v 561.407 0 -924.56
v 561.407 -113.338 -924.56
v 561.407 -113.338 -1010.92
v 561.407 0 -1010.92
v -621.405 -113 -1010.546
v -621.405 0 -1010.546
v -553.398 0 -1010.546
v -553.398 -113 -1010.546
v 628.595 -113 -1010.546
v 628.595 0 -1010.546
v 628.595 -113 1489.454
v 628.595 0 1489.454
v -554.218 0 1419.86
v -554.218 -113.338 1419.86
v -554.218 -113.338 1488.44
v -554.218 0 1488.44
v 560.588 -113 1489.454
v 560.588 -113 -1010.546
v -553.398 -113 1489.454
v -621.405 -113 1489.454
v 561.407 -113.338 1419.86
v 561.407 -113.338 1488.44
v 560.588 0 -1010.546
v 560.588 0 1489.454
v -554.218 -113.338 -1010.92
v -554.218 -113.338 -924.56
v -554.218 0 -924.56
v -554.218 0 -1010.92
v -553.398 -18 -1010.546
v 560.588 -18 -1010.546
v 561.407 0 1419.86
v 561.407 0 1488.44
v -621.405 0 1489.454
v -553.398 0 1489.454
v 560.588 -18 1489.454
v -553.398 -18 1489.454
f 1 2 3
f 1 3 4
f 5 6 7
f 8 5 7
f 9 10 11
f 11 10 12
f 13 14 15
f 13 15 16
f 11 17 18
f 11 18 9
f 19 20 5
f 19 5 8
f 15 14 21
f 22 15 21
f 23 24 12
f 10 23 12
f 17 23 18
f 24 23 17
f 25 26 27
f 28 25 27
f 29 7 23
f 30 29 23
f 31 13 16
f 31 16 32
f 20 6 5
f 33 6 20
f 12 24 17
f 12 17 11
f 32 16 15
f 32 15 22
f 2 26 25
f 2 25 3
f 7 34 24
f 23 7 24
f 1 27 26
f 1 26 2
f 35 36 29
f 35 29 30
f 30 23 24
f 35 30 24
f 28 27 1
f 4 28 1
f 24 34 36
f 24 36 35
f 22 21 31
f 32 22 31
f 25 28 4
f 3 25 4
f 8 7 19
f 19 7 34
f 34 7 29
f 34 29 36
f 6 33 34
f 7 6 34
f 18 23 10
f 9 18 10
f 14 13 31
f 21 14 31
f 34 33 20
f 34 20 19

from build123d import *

# Parameters (mm, degrees)
F0_W     = 68.0070072412
F0_H     = 2500
F1_DEPTH = 113
F0_W_2   = 1113.9859855175
F2_DEPTH = 18
F4_START = 1419.86
F3_W     = 1115.6250238419
F3_H     = 113.3375018835
F4_DEPTH = 68.58
F5_START = -924.56
F5_DEPTH = 86.36


with BuildPart() as f1:
    # F0 (on Front) → F1 (new body)
    with BuildSketch(Plane.XZ):
        with Locations((-587.4015763402, 239.4538540301)):
            Rectangle(F0_W, F0_H)
    extrude(amount=F1_DEPTH)


with BuildPart() as f1b:
    # F0 (on Front) → F1, piece 2 (new body)
    with BuildSketch(Plane.XZ):
        with Locations((594.5914164186, 239.4538540301)):
            Rectangle(F0_W, F0_H)
    extrude(amount=F1_DEPTH)


with BuildPart() as f2:
    # F0 (on Front) → F2 (new body)
    with BuildSketch(Plane.XZ):
        with Locations((3.5949200392, 239.4538540301)):
            Rectangle(F0_W_2, F0_H)
    extrude(amount=F2_DEPTH)


with BuildPart() as f4:
    # F3 (on Top) → F4 (new body)
    with BuildSketch(Plane.XY.offset(F4_START)):
        with Locations((3.5949349403, -56.6687509418)):
            Rectangle(F3_W, F3_H)
    extrude(amount=F4_DEPTH)


with BuildPart() as f5:
    # F3 (on Top) → F5 (new body)
    with BuildSketch(Plane.XY.offset(F5_START)):
        with Locations((3.5949349403, -56.6687509418)):
            Rectangle(F3_W, F3_H)
    extrude(amount=-F5_DEPTH)


solid = Compound([f1.part, f1b.part, f2.part, f4.part, f5.part])
